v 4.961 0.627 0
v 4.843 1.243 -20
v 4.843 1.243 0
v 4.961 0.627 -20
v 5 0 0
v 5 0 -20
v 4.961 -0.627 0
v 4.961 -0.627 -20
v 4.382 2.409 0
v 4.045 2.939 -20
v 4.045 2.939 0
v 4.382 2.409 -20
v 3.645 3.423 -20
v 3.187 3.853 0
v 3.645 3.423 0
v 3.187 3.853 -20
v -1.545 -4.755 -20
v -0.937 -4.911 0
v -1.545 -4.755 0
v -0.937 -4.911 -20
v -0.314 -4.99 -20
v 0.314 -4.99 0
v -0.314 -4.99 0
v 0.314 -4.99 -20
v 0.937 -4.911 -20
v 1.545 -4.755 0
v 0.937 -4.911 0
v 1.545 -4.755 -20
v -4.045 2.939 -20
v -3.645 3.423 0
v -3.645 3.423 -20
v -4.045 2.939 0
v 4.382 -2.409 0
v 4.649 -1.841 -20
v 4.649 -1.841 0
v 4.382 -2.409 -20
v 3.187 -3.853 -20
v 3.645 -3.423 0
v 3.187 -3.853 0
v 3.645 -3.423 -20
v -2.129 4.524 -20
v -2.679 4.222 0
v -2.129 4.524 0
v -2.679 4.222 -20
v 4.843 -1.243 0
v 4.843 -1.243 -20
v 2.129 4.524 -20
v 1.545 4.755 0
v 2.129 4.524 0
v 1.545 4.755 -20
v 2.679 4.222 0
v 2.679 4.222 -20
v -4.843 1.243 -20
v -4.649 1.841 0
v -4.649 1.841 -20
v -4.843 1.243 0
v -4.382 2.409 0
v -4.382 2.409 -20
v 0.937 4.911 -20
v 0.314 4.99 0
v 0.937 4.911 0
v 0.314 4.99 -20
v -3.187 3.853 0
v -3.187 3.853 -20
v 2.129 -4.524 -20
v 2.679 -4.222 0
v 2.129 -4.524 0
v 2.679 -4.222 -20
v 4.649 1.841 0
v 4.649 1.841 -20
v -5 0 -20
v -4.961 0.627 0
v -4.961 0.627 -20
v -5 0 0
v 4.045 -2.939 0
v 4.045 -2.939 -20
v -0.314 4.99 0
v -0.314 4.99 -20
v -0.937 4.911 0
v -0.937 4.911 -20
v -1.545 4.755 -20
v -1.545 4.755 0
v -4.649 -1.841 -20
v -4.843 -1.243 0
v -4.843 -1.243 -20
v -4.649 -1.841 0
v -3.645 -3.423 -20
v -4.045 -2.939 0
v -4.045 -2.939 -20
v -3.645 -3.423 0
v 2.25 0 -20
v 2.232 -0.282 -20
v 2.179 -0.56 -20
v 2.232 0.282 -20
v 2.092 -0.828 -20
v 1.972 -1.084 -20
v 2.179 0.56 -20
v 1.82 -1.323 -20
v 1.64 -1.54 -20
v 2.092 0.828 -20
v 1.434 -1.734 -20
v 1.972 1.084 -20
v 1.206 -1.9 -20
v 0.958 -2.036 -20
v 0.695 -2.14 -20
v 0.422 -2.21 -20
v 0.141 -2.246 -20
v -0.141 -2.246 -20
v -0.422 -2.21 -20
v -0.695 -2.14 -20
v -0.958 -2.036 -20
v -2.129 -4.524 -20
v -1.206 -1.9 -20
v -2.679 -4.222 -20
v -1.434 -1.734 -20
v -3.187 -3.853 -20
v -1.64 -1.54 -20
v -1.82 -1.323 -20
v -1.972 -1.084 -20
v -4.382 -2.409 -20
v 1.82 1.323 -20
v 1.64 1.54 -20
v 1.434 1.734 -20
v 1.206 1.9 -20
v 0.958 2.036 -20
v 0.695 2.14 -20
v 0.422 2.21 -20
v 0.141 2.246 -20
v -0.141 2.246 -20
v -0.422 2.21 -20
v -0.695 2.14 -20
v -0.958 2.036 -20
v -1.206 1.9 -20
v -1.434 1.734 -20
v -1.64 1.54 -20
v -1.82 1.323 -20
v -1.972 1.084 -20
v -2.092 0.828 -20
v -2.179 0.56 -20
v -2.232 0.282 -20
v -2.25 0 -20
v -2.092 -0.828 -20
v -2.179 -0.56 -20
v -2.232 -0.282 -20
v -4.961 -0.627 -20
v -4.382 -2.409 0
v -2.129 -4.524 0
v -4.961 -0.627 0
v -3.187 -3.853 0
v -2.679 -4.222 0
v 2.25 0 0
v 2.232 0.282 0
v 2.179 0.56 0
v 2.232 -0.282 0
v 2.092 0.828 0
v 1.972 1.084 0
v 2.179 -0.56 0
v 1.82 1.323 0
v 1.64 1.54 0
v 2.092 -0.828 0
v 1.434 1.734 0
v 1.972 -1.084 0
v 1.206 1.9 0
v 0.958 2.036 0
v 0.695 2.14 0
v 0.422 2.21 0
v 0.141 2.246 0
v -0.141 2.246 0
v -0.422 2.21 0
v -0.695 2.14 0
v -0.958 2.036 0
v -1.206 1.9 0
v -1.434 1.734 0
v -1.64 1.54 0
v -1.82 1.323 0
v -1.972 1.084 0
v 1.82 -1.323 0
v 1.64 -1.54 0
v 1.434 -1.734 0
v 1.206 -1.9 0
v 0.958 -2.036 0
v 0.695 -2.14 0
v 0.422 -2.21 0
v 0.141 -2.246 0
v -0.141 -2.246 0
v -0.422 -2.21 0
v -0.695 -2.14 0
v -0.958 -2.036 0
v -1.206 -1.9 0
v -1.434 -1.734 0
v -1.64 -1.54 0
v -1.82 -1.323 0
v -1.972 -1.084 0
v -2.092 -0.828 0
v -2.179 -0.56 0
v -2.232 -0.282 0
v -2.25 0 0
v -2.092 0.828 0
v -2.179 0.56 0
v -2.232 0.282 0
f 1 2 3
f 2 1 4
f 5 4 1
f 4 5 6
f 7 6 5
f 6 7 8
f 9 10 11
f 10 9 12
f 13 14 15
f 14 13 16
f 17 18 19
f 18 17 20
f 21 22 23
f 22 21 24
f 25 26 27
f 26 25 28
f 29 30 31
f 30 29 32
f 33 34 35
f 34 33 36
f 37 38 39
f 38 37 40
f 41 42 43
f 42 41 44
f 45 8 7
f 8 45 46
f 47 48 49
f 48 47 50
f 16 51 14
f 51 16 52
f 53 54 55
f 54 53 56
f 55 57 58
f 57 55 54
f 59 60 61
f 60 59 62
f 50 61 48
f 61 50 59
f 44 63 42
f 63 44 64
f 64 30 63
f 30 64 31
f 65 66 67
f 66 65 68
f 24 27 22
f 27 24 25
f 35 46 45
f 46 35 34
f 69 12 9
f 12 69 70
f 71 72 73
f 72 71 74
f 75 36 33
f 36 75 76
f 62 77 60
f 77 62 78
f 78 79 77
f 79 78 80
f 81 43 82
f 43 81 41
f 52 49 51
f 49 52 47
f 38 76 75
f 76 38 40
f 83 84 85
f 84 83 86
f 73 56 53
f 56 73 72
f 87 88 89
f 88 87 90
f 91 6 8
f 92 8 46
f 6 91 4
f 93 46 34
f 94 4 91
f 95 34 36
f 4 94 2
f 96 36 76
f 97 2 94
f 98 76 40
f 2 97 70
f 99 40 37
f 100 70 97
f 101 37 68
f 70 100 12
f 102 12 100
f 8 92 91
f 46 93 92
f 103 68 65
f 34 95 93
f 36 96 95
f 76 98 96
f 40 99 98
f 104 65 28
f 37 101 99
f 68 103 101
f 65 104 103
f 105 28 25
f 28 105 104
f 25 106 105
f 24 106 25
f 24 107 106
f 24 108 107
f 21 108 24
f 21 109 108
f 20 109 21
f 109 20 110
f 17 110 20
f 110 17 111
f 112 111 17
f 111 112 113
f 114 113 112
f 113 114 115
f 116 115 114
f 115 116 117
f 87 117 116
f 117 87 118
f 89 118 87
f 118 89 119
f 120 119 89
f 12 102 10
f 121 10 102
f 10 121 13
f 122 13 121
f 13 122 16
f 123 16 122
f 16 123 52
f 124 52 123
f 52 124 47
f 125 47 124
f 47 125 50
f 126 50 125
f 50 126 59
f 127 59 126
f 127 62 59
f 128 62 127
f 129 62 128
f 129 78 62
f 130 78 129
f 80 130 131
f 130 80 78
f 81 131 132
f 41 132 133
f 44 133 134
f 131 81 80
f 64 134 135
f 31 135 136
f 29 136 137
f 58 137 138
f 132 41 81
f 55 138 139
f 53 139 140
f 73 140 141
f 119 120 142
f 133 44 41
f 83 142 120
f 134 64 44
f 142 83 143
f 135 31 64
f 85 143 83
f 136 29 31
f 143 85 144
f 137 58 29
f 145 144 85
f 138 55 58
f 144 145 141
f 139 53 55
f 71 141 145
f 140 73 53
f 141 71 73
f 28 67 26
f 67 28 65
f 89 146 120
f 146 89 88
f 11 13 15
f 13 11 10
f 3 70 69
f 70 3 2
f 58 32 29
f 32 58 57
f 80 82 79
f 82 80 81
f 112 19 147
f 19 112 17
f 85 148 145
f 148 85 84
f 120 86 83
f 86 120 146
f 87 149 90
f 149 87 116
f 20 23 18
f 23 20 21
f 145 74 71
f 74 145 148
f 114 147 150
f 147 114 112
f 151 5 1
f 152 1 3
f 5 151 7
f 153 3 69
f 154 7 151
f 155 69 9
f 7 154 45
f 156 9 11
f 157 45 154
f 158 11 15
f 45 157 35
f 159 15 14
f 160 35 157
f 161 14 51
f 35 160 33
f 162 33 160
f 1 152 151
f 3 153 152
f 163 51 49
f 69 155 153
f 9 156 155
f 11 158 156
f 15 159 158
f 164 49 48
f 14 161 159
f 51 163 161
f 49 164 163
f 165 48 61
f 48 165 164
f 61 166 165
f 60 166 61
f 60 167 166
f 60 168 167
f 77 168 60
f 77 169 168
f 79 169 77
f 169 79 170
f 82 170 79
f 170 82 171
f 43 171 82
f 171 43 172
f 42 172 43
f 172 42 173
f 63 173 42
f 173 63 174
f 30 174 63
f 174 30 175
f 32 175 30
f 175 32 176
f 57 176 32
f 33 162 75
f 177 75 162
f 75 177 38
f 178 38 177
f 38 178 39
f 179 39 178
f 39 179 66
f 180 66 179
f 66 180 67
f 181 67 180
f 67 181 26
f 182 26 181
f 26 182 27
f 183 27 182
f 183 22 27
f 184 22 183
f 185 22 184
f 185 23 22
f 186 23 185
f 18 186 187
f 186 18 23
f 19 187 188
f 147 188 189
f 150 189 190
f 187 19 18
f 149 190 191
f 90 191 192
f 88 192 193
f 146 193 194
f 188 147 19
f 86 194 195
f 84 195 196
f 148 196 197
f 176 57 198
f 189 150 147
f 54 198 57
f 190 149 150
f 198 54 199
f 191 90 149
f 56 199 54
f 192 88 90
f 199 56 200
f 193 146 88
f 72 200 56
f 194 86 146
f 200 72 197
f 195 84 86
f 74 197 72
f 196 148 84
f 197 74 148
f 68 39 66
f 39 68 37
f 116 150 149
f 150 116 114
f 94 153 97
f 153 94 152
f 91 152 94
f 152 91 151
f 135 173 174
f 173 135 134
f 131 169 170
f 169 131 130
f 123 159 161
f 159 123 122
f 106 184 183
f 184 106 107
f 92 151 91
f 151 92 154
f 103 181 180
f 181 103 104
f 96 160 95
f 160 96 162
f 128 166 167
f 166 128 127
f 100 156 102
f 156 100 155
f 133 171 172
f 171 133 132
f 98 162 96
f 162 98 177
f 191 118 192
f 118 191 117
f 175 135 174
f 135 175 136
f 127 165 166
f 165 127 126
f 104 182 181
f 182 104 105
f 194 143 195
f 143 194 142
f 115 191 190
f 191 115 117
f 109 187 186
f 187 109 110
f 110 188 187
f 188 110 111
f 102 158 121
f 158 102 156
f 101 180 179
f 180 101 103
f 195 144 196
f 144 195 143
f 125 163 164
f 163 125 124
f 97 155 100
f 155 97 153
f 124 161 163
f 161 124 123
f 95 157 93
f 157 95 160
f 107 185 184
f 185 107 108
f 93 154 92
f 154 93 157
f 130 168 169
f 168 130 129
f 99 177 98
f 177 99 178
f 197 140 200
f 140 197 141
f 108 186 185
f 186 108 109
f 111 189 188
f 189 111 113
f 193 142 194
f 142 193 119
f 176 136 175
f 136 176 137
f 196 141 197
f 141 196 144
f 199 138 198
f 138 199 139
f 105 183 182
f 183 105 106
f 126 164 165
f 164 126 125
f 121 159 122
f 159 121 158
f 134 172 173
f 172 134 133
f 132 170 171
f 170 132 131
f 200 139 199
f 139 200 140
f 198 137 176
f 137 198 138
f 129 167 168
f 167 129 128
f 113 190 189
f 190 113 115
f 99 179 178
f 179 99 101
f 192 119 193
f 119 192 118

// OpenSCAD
$fn = 50;


difference() {
	union() {
		translate(v = [0, 0, -20.0000000000]) {
			cylinder(h = 20, r = 5.0000000000);
		}
		cylinder(h = 0, r = 8.0000000000);
	}
	union() {
		#translate(v = [0, 0, -20]) {
			cylinder(h = 20, r = 2.2500000000);
		}
	}
}
